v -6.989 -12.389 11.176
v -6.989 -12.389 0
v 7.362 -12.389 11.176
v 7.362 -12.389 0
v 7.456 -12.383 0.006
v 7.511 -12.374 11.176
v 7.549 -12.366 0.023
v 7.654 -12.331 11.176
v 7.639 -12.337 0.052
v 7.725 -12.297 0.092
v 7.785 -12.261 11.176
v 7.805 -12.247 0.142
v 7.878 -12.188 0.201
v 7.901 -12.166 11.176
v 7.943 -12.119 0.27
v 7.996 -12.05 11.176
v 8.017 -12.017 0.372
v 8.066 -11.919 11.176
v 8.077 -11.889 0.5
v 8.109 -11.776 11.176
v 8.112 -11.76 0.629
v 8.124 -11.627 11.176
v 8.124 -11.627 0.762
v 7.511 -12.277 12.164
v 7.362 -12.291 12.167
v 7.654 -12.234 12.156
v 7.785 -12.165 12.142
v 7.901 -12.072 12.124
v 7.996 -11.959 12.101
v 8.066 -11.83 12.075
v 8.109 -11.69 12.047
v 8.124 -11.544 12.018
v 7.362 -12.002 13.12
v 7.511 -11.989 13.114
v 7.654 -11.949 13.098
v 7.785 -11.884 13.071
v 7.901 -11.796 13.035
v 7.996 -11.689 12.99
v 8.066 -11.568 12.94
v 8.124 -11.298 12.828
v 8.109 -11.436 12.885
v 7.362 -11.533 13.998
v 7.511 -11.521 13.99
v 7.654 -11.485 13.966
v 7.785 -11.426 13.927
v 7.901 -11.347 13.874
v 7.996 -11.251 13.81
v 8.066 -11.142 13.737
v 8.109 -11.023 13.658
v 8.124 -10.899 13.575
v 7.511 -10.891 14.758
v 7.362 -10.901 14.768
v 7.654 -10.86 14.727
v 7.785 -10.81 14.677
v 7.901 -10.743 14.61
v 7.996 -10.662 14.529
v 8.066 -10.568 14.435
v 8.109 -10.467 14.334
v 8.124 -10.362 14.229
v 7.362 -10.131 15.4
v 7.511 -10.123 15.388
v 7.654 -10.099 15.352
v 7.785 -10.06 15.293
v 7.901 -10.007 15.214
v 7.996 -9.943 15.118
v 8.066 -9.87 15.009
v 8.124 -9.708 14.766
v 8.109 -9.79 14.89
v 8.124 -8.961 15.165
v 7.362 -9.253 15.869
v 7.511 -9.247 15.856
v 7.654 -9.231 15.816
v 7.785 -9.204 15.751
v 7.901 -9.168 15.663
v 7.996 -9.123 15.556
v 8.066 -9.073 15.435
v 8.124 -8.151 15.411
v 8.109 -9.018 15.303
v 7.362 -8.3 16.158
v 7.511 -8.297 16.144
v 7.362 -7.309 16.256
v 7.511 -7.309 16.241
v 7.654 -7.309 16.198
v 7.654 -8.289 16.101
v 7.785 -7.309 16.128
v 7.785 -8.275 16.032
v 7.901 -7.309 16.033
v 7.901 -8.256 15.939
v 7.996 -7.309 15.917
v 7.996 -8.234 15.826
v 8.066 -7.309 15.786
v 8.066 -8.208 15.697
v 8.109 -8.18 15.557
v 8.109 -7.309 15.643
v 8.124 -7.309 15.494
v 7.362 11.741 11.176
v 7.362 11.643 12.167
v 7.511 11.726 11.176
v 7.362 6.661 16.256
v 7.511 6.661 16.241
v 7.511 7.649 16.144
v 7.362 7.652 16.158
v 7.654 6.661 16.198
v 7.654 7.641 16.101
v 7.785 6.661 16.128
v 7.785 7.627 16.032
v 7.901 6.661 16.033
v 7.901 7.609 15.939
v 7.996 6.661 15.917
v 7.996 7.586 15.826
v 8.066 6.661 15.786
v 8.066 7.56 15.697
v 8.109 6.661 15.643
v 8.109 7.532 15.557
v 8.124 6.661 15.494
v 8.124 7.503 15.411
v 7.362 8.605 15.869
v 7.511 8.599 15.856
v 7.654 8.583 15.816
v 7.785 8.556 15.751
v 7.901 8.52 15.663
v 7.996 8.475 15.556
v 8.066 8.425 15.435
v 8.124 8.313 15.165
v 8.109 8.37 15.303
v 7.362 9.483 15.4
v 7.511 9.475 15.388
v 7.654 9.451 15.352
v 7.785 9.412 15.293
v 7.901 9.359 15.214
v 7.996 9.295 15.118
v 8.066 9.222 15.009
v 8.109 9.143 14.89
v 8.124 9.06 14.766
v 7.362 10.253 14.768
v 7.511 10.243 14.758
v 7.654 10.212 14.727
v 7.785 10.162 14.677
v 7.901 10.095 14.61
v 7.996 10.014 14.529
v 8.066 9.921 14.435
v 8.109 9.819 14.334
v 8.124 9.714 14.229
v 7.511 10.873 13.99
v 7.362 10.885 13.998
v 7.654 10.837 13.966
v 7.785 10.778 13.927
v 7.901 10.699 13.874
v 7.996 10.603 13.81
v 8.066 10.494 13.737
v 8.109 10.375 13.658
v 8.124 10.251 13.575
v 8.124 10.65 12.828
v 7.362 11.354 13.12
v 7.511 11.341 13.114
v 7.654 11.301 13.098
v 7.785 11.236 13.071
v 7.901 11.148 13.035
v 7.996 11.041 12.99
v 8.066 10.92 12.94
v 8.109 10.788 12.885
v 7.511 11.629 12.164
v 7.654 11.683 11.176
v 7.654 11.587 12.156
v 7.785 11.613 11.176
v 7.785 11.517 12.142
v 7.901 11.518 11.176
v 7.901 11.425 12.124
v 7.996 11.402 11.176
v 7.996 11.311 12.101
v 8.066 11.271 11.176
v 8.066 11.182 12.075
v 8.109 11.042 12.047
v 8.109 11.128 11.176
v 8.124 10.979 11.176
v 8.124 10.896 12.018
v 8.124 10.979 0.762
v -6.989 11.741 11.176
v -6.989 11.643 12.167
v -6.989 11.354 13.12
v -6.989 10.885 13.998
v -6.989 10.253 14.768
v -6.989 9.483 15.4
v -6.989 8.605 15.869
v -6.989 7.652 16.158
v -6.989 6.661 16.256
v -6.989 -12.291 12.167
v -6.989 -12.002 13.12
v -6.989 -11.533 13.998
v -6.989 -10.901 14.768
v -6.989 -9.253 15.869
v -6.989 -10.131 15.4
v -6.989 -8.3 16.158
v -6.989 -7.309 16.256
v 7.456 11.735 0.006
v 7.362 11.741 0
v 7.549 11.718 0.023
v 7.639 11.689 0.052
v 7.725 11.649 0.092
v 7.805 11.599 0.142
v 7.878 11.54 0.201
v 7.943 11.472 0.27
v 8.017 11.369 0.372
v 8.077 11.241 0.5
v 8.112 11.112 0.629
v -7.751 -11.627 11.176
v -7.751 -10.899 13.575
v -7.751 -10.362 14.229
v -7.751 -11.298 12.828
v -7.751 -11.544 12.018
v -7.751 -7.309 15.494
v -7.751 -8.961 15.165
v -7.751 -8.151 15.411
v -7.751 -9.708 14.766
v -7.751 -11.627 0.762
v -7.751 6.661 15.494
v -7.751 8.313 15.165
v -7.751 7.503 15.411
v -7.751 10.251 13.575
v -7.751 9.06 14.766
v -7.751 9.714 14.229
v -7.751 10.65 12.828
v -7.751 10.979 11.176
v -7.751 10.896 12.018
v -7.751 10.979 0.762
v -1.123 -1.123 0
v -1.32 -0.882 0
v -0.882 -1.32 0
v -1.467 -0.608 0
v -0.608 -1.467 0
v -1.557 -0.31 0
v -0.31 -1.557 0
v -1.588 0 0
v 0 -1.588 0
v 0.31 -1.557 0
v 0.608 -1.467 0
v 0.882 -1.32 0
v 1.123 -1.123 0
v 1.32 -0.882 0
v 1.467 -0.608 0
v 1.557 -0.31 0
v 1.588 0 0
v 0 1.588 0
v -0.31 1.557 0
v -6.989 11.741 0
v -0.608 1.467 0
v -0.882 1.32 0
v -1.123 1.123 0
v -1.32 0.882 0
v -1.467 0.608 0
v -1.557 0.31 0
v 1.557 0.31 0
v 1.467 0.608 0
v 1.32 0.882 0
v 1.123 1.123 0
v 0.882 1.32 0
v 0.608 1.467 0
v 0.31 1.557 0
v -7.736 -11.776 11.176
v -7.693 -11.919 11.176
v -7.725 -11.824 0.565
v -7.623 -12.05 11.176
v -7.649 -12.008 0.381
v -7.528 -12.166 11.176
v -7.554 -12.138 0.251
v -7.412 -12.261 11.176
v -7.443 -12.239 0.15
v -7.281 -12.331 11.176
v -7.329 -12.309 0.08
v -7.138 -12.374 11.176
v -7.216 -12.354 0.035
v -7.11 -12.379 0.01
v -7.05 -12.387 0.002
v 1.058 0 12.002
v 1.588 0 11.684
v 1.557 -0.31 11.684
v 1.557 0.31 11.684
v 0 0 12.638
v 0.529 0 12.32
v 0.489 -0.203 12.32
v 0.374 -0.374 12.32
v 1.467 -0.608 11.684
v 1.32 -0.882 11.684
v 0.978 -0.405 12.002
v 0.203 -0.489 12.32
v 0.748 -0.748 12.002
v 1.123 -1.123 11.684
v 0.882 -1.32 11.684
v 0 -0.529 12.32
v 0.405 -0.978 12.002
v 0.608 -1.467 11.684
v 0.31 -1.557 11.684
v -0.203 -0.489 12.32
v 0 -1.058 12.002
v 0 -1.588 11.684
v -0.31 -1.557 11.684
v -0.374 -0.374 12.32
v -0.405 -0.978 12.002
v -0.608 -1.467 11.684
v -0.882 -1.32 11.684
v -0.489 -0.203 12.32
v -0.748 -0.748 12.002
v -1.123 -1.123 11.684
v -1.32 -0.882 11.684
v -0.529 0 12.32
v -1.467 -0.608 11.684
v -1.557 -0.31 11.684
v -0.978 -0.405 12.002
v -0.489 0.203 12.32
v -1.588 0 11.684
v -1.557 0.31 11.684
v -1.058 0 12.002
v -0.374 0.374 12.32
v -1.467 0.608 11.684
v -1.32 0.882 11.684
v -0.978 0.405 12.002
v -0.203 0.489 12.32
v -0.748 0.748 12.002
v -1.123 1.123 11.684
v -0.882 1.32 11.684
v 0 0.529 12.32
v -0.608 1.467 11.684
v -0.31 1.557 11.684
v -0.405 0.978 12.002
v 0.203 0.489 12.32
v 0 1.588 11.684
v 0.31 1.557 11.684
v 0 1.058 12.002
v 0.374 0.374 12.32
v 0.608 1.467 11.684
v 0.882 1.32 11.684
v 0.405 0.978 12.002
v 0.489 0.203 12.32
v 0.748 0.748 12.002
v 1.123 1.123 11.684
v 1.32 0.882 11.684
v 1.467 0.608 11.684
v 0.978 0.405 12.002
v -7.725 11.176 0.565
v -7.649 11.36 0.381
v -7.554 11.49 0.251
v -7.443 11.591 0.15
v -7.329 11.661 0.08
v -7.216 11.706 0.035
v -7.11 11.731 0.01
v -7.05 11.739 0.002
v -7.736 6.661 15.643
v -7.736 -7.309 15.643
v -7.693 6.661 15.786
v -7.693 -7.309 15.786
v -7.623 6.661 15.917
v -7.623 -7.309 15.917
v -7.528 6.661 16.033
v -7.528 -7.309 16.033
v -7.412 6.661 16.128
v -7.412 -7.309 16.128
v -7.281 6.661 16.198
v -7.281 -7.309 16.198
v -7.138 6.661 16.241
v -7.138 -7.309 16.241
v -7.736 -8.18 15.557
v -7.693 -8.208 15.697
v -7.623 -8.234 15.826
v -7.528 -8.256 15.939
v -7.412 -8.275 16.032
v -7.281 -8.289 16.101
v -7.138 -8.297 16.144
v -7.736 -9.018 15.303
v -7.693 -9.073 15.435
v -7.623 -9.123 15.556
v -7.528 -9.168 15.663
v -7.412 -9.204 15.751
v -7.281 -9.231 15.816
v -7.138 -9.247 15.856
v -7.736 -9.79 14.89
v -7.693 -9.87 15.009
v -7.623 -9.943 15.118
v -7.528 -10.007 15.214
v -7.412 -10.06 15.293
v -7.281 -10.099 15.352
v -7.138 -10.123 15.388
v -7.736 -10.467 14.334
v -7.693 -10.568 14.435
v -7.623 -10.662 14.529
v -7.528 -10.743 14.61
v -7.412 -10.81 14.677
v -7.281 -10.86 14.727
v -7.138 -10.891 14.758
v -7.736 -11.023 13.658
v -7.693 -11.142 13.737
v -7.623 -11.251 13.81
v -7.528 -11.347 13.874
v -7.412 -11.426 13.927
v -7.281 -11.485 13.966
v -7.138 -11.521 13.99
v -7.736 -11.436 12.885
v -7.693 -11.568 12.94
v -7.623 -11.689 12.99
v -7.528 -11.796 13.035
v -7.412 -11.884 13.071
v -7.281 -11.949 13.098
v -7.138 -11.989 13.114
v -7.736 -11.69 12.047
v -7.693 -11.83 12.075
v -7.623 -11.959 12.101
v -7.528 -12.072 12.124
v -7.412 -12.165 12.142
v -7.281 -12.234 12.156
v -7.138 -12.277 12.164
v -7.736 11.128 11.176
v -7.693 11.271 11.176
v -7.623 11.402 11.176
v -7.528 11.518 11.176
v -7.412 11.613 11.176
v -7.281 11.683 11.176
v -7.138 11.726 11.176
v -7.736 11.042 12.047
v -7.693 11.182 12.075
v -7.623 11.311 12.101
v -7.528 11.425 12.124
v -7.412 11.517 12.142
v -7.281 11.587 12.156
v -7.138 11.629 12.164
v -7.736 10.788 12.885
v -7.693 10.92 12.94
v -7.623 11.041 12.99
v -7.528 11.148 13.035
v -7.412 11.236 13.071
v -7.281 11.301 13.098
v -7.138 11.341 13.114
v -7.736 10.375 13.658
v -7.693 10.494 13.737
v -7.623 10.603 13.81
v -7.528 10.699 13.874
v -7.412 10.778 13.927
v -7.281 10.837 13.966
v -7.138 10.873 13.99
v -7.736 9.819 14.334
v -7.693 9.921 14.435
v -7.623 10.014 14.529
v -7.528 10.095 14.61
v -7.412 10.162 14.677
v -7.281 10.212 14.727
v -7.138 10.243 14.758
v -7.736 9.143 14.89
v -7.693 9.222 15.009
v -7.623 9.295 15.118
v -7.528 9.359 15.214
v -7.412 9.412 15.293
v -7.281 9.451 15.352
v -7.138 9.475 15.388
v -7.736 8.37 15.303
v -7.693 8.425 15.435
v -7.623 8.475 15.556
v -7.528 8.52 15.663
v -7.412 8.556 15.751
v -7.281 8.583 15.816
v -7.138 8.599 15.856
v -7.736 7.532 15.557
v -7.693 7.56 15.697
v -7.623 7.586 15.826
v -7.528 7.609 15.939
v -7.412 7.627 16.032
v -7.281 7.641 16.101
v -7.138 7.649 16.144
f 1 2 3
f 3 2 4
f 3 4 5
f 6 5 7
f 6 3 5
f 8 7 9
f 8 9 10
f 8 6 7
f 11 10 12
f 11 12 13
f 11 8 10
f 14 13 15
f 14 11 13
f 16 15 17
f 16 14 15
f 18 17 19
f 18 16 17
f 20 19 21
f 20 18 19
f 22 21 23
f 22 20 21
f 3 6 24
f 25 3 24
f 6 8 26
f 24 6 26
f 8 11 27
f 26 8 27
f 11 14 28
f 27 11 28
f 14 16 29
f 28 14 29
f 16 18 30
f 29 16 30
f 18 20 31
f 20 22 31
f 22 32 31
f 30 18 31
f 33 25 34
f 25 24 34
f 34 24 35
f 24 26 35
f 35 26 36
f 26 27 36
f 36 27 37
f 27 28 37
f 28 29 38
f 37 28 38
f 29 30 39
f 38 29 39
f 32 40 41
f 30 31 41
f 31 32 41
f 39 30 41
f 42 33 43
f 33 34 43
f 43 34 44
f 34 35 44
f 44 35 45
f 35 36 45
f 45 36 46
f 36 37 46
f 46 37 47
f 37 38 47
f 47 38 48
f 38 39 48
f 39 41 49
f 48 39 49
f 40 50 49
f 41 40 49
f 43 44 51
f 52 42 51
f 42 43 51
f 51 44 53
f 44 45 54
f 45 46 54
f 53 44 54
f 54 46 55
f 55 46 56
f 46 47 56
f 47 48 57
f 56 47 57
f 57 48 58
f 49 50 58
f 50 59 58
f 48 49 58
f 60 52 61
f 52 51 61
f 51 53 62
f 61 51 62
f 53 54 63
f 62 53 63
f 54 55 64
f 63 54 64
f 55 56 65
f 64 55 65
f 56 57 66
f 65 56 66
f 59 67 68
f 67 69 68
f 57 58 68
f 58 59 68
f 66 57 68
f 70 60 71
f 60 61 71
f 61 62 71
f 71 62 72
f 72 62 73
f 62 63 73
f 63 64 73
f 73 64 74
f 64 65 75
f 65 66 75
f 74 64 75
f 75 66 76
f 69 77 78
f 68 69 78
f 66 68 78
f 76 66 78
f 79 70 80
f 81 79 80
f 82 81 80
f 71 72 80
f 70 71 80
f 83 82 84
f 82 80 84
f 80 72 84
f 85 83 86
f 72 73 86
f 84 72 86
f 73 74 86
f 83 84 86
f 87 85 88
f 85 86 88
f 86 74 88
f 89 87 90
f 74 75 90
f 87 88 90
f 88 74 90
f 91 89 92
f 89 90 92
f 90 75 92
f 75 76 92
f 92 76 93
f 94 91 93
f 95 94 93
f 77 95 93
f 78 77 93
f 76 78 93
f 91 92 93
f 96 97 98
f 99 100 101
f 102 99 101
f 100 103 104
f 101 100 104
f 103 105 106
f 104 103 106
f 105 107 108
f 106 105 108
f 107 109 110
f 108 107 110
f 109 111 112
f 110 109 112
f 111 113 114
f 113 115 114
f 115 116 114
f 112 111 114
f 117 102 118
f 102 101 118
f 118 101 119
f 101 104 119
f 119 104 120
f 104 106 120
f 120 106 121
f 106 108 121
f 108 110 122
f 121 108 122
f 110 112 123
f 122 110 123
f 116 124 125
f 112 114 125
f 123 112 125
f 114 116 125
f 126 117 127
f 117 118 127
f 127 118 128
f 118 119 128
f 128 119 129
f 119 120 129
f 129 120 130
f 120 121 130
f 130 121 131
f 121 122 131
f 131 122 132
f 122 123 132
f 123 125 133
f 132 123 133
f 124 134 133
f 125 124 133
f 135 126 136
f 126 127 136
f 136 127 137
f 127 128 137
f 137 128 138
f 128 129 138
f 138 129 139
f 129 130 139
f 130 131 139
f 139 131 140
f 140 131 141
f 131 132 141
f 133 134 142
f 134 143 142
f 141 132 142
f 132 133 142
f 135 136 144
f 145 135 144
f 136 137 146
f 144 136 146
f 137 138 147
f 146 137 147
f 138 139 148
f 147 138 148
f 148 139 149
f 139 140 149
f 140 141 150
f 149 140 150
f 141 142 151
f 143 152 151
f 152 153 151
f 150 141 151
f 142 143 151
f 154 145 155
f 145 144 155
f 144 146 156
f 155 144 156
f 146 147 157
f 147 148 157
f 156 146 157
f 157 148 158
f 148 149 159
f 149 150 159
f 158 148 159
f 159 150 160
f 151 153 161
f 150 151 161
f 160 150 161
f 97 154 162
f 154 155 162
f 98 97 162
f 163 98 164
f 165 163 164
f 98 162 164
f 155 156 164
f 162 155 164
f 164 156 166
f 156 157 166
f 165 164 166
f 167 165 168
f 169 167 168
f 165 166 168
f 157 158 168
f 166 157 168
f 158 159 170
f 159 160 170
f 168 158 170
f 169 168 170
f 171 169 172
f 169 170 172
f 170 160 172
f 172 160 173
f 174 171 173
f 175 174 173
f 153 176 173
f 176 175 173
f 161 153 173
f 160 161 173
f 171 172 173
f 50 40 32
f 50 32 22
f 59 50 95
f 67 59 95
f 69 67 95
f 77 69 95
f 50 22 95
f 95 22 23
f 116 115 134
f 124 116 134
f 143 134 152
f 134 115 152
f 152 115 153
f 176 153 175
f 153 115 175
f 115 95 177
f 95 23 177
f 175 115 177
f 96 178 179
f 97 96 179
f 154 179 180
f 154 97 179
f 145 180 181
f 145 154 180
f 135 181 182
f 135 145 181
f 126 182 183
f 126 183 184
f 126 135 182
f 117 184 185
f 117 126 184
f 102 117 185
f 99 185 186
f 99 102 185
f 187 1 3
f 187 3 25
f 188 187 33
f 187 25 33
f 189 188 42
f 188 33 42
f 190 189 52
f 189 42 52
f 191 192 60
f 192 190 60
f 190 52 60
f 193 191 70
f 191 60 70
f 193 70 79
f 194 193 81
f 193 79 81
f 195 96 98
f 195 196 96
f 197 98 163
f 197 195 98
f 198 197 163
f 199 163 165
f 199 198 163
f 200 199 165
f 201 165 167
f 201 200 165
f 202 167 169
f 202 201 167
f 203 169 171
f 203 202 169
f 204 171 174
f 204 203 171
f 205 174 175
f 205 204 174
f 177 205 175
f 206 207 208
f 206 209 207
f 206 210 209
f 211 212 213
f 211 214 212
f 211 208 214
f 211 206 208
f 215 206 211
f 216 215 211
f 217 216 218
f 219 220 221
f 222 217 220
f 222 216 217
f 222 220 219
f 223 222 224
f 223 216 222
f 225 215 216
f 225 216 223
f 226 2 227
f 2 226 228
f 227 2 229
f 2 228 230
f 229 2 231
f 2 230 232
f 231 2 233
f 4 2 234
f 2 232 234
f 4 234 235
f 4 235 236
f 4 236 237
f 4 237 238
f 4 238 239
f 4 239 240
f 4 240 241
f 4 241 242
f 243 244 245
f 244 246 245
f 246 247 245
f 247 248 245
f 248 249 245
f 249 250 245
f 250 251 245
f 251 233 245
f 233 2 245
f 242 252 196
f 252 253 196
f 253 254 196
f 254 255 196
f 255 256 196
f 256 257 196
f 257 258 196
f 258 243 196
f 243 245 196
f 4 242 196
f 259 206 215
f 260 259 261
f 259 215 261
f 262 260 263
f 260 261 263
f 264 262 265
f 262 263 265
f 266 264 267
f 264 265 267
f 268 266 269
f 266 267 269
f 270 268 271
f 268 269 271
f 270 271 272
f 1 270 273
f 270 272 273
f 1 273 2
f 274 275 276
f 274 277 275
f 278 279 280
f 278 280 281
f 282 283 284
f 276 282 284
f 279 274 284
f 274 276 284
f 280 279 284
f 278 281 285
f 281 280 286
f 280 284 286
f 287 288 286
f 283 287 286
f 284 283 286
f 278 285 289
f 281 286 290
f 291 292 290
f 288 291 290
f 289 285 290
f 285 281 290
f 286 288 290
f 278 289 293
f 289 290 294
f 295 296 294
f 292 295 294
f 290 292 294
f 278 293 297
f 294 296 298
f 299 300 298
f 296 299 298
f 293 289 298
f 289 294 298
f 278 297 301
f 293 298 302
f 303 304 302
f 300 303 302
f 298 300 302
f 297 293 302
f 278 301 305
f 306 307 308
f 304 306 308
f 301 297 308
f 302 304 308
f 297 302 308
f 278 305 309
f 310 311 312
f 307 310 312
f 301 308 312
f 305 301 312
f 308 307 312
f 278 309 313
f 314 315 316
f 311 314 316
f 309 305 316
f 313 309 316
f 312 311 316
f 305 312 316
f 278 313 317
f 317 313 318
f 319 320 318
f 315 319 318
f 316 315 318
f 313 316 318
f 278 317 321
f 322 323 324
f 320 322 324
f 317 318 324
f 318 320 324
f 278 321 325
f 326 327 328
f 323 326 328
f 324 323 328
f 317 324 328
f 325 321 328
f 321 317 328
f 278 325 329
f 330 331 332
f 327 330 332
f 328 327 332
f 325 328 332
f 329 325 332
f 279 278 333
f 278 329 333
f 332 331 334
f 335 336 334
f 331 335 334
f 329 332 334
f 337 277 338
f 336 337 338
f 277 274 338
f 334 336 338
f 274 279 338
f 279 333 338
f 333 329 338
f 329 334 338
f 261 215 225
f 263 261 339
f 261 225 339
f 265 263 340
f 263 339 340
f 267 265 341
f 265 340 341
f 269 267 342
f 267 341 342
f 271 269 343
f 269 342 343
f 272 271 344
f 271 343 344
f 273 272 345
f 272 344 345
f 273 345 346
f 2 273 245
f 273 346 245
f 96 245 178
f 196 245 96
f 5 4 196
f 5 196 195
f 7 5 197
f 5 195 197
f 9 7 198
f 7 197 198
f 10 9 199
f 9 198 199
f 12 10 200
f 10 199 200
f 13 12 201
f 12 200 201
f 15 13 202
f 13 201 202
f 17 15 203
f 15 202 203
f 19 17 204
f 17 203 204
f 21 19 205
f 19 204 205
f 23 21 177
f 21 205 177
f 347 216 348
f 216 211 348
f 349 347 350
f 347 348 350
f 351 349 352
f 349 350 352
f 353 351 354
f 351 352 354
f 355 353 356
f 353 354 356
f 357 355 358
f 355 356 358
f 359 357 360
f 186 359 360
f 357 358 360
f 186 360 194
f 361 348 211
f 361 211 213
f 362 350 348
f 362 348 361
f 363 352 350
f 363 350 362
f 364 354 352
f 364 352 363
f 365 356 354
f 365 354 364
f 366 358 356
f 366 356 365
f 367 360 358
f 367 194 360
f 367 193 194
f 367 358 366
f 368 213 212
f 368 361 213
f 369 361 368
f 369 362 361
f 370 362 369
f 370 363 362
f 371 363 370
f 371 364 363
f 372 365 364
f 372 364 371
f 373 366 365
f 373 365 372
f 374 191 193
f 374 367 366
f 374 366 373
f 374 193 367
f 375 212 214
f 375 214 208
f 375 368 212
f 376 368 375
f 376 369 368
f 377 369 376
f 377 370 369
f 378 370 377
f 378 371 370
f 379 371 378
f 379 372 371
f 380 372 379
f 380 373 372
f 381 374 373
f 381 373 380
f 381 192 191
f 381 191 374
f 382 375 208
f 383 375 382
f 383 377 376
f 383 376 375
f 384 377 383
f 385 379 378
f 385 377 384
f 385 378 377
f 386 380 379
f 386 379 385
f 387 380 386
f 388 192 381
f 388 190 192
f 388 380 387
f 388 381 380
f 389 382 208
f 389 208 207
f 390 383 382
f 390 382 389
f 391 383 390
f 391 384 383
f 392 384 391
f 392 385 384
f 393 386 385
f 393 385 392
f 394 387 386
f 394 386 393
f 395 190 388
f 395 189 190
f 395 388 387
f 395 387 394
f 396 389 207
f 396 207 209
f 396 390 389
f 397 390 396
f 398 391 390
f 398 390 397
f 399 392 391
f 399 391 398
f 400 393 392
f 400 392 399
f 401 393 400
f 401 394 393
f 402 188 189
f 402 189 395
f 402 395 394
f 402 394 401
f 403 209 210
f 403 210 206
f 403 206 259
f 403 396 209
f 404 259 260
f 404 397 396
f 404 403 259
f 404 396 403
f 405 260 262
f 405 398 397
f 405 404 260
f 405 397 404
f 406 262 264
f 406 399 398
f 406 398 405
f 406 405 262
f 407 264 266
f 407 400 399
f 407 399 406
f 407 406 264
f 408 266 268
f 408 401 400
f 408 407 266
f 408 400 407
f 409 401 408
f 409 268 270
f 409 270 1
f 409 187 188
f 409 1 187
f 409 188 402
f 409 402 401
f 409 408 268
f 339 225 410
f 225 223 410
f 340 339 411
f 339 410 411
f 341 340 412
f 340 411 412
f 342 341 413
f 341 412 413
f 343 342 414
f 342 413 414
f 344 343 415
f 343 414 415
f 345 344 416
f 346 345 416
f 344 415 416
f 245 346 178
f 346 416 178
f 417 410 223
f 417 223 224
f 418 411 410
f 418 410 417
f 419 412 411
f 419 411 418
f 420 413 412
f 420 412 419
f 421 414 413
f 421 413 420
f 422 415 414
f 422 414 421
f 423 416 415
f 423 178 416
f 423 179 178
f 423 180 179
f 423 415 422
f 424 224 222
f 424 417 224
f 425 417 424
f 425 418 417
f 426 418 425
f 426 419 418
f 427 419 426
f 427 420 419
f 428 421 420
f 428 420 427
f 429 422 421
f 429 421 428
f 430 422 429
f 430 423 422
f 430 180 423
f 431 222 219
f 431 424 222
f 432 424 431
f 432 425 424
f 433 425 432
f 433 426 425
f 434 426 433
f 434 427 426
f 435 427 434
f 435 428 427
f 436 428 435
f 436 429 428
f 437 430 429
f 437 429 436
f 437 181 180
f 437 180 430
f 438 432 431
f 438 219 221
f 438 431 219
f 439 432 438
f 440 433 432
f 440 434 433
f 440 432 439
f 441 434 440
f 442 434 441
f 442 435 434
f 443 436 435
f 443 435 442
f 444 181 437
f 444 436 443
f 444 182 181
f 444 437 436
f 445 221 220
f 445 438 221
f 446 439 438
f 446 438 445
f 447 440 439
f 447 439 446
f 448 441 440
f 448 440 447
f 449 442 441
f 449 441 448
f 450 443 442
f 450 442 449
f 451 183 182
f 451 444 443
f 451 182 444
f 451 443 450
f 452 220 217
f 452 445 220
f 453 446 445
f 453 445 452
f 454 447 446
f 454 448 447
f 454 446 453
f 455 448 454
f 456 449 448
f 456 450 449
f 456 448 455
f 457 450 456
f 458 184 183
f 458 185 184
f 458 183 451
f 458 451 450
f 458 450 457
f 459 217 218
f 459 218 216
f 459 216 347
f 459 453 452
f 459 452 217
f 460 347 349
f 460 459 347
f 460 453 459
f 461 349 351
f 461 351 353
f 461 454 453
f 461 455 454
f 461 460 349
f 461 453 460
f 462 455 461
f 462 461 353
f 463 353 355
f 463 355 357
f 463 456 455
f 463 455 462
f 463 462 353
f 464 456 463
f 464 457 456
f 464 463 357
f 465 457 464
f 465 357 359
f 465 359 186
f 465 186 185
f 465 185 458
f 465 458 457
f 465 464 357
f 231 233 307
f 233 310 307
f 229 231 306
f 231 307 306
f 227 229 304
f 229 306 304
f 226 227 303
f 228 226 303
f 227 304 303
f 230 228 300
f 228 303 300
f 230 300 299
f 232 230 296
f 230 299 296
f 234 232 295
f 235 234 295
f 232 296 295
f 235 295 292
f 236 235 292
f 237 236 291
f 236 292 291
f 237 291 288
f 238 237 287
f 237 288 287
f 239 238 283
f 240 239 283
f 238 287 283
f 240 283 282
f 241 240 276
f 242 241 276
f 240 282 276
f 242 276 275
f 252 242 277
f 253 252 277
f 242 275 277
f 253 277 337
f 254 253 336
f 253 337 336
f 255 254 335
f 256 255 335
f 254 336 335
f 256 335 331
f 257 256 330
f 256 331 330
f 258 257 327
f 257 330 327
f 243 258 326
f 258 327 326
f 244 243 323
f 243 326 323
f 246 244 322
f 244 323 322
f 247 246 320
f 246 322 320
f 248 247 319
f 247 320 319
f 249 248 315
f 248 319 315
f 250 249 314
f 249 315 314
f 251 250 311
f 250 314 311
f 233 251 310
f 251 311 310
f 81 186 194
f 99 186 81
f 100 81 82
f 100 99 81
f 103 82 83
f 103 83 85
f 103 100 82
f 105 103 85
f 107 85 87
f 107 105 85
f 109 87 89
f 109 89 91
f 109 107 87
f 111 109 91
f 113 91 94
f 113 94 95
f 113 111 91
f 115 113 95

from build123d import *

# Parameters (mm, degrees)
F0_W     = 15.875
F0_H     = 24.13
F1_DEPTH = 16.256
F2_D     = 3.175
F2_DEPTH = 11.684
F2_TIP   = 0.9538662327
F3_R     = 5.08
F4_R     = 0.762


with BuildPart() as f1:
    # F0 (on Top) → F1 (new body)
    with BuildSketch(Plane.XY):
        with Locations((0.1865295499, -0.323939874)):
            Rectangle(F0_W, F0_H)
    extrude(amount=F1_DEPTH)

    # F2
    with Locations(Plane(origin=(0, 0, 0), x_dir=(1, 0, 0), z_dir=(0, 0, -1))):
        with Locations((0, 0)):
            Hole(F2_D / 2, depth=F2_DEPTH)
            with Locations((0, 0, -(F2_DEPTH + F2_TIP / 2))):  # 118° drill point
                Cone(0, F2_D / 2, F2_TIP, mode=Mode.SUBTRACT)

    # F3
    f3_edges = [f1.edges().sort_by_distance(p)[0] for p in [
        (0.18653, -12.38894, 16.256),
        (0.18653, 11.74106, 16.256),
    ]]
    fillet(f3_edges, radius=F3_R)

    # F4
    f4_edges = [f1.edges().sort_by_distance(p)[0] for p in [
        (8.12403, -12.38894, 5.588),
        (8.12403, -10.901042, 14.768102),
        (8.12403, -0.32394, 0),
        (8.12403, -0.32394, 16.256),
        (8.12403, 11.74106, 5.588),
        (8.12403, 10.253163, 14.768102),
        (-7.75097, 11.74106, 5.588),
        (-7.75097, 10.253163, 14.768102),
        (-7.75097, -0.32394, 0),
        (-7.75097, -0.32394, 16.256),
        (-7.75097, -12.38894, 5.588),
        (-7.75097, -10.901042, 14.768102),
    ]]
    fillet(f4_edges, radius=F4_R)


solid = f1.part
